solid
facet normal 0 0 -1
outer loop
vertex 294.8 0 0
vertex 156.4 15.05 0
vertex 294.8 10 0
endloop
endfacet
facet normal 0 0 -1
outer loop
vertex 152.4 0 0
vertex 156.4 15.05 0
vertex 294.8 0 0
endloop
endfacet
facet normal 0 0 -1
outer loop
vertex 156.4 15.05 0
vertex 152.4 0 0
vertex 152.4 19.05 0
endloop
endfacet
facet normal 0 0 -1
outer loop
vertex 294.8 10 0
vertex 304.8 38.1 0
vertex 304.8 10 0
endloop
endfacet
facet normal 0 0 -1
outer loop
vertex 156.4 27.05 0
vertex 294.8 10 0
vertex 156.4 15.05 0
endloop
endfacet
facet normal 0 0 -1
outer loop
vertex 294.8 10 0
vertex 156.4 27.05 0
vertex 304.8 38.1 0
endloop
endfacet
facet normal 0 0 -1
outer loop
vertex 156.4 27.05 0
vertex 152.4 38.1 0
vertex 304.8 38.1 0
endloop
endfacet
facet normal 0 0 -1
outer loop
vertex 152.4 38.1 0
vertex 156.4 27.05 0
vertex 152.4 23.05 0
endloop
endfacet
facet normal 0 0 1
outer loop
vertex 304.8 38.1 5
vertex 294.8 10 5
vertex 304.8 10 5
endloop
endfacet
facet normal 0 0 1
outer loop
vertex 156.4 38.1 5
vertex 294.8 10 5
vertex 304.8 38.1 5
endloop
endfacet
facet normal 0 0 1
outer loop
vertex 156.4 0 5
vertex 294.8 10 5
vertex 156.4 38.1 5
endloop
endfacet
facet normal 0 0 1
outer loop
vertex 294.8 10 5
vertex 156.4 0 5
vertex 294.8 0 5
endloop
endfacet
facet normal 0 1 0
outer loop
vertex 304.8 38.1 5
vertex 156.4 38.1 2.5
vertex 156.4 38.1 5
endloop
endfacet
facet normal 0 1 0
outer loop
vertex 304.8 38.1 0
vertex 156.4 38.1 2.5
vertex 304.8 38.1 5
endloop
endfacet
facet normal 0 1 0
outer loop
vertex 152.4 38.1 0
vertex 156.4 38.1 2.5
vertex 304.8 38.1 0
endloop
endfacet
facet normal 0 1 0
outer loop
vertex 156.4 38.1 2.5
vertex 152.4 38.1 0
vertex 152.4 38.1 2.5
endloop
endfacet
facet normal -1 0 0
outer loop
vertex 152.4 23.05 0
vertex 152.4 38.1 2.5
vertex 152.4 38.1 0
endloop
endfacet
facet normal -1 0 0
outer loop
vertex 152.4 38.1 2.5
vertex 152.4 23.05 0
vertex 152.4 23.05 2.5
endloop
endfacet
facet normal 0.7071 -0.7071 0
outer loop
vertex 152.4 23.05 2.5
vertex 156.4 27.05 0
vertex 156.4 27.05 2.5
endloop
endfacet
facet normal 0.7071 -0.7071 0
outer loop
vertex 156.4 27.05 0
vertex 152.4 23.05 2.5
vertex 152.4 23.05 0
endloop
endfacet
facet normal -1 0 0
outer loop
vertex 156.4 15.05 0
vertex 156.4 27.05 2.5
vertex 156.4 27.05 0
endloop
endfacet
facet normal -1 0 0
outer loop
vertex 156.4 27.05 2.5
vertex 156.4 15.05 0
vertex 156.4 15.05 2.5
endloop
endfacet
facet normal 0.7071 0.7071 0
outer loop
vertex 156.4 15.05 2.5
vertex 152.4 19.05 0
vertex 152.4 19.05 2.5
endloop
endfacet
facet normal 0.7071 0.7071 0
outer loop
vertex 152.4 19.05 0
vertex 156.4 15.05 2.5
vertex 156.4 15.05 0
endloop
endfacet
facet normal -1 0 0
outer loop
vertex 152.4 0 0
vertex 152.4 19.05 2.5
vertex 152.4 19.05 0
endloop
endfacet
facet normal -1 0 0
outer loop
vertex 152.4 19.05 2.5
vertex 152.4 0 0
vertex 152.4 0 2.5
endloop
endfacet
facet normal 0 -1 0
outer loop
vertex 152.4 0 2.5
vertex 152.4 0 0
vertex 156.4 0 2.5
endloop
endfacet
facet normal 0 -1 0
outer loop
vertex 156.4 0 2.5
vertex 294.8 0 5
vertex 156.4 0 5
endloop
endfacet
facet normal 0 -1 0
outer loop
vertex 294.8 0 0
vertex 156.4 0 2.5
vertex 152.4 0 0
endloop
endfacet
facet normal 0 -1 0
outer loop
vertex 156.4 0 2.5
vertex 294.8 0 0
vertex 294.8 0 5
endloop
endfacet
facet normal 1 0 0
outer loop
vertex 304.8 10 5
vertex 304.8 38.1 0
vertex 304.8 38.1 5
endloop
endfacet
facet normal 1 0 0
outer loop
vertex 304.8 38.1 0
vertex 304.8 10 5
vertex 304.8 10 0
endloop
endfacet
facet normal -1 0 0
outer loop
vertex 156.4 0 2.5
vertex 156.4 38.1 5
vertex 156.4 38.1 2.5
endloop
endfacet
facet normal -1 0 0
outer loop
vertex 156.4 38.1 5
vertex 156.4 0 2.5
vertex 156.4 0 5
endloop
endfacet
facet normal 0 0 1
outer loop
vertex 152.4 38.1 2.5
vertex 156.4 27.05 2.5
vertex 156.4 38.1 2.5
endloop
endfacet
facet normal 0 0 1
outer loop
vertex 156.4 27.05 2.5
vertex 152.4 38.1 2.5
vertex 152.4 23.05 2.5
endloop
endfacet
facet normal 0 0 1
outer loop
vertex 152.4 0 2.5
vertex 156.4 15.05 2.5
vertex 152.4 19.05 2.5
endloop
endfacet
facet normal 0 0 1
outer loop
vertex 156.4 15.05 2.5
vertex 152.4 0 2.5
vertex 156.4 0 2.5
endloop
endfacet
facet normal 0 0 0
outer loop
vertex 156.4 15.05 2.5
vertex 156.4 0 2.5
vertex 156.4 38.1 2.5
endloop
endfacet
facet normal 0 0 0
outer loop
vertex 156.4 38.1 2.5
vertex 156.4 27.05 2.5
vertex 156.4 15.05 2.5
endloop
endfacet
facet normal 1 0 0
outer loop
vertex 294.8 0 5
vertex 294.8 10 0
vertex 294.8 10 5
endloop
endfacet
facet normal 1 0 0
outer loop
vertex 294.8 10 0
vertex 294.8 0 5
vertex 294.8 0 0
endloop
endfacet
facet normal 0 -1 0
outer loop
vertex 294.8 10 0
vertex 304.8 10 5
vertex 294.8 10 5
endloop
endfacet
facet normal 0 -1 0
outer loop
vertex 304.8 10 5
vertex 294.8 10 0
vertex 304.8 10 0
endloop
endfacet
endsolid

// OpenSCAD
in=25.4;
module piece1() {
    linear_extrude(5) polygon([[0,10],[in,10],[in,0],[11/2*in,0],[11/2*in,in],[11/2*in-4,in-4],[11/2*in-4,in+8],[11/2*in,in+4],[11/2*in,2.4*in],[11/2*in-4,2.4*in-4],[11/2*in-4,2.4*in+8],[11/2*in,2.4*in+4],[11/2*in,(3.75+3.375)/2*in],[0,3.75*in]]);
    translate([11/2*in-4,0,5/2]) cube([4,3.375*in,5/2]);
}
module piece2() {
    difference() {
        linear_extrude(5) polygon([[11/2*in,(3.75+3.375)/2*in],[11*in,3.375*in],[11*in,10],[10*in,10],[10*in,0],[11/2*in,0],[11/2*in,in],[11/2*in-4,in-4],[11/2*in-4,in+8],[11/2*in,in+4],[11/2*in,2.4*in],[11/2*in-4,2.4*in-4],[11/2*in-4,2.4*in-4],[11/2*in-4,2.4*in+8],[11/2*in,2.4*in+4]]);
        translate([11/2*in-4.05,0,5/2]) cube([4,3.375*in,5/2]);
    }  
}
module piece3() {
    difference() {
        linear_extrude(5) polygon([[0,0],[0,1.5*in],[6*in,1.5*in],[6*in,0.75*in+4],[6*in+4,0.75*in+8],[6*in+4,0.75*in-4],[6*in,0.75*in],[6*in,0]]);
        translate([0,0,1.2]) cube([10,1.5*in,5-1.2]);
    }    
    translate([6*in,0,5/2]) cube([4,1.5*in,5/2]);
}    
module piece4() {
    difference() {
        linear_extrude(5) polygon([[6*in,0],[12*in,0],[12*in,1.5*in],[6*in,1.5*in],[6*in,0.75*in+4],[6*in+4,0.75*in+8],[6*in+4,0.75*in-4],[6*in,0.75*in]]);
        translate([6*in-0.05,0,5/2]) cube([4.05,1.5*in,5/2]);
        translate([12*in-10,0,0]) cube([10,10,5]);
    }  
}
//piece1();
//piece2();
//piece3();
piece4();
